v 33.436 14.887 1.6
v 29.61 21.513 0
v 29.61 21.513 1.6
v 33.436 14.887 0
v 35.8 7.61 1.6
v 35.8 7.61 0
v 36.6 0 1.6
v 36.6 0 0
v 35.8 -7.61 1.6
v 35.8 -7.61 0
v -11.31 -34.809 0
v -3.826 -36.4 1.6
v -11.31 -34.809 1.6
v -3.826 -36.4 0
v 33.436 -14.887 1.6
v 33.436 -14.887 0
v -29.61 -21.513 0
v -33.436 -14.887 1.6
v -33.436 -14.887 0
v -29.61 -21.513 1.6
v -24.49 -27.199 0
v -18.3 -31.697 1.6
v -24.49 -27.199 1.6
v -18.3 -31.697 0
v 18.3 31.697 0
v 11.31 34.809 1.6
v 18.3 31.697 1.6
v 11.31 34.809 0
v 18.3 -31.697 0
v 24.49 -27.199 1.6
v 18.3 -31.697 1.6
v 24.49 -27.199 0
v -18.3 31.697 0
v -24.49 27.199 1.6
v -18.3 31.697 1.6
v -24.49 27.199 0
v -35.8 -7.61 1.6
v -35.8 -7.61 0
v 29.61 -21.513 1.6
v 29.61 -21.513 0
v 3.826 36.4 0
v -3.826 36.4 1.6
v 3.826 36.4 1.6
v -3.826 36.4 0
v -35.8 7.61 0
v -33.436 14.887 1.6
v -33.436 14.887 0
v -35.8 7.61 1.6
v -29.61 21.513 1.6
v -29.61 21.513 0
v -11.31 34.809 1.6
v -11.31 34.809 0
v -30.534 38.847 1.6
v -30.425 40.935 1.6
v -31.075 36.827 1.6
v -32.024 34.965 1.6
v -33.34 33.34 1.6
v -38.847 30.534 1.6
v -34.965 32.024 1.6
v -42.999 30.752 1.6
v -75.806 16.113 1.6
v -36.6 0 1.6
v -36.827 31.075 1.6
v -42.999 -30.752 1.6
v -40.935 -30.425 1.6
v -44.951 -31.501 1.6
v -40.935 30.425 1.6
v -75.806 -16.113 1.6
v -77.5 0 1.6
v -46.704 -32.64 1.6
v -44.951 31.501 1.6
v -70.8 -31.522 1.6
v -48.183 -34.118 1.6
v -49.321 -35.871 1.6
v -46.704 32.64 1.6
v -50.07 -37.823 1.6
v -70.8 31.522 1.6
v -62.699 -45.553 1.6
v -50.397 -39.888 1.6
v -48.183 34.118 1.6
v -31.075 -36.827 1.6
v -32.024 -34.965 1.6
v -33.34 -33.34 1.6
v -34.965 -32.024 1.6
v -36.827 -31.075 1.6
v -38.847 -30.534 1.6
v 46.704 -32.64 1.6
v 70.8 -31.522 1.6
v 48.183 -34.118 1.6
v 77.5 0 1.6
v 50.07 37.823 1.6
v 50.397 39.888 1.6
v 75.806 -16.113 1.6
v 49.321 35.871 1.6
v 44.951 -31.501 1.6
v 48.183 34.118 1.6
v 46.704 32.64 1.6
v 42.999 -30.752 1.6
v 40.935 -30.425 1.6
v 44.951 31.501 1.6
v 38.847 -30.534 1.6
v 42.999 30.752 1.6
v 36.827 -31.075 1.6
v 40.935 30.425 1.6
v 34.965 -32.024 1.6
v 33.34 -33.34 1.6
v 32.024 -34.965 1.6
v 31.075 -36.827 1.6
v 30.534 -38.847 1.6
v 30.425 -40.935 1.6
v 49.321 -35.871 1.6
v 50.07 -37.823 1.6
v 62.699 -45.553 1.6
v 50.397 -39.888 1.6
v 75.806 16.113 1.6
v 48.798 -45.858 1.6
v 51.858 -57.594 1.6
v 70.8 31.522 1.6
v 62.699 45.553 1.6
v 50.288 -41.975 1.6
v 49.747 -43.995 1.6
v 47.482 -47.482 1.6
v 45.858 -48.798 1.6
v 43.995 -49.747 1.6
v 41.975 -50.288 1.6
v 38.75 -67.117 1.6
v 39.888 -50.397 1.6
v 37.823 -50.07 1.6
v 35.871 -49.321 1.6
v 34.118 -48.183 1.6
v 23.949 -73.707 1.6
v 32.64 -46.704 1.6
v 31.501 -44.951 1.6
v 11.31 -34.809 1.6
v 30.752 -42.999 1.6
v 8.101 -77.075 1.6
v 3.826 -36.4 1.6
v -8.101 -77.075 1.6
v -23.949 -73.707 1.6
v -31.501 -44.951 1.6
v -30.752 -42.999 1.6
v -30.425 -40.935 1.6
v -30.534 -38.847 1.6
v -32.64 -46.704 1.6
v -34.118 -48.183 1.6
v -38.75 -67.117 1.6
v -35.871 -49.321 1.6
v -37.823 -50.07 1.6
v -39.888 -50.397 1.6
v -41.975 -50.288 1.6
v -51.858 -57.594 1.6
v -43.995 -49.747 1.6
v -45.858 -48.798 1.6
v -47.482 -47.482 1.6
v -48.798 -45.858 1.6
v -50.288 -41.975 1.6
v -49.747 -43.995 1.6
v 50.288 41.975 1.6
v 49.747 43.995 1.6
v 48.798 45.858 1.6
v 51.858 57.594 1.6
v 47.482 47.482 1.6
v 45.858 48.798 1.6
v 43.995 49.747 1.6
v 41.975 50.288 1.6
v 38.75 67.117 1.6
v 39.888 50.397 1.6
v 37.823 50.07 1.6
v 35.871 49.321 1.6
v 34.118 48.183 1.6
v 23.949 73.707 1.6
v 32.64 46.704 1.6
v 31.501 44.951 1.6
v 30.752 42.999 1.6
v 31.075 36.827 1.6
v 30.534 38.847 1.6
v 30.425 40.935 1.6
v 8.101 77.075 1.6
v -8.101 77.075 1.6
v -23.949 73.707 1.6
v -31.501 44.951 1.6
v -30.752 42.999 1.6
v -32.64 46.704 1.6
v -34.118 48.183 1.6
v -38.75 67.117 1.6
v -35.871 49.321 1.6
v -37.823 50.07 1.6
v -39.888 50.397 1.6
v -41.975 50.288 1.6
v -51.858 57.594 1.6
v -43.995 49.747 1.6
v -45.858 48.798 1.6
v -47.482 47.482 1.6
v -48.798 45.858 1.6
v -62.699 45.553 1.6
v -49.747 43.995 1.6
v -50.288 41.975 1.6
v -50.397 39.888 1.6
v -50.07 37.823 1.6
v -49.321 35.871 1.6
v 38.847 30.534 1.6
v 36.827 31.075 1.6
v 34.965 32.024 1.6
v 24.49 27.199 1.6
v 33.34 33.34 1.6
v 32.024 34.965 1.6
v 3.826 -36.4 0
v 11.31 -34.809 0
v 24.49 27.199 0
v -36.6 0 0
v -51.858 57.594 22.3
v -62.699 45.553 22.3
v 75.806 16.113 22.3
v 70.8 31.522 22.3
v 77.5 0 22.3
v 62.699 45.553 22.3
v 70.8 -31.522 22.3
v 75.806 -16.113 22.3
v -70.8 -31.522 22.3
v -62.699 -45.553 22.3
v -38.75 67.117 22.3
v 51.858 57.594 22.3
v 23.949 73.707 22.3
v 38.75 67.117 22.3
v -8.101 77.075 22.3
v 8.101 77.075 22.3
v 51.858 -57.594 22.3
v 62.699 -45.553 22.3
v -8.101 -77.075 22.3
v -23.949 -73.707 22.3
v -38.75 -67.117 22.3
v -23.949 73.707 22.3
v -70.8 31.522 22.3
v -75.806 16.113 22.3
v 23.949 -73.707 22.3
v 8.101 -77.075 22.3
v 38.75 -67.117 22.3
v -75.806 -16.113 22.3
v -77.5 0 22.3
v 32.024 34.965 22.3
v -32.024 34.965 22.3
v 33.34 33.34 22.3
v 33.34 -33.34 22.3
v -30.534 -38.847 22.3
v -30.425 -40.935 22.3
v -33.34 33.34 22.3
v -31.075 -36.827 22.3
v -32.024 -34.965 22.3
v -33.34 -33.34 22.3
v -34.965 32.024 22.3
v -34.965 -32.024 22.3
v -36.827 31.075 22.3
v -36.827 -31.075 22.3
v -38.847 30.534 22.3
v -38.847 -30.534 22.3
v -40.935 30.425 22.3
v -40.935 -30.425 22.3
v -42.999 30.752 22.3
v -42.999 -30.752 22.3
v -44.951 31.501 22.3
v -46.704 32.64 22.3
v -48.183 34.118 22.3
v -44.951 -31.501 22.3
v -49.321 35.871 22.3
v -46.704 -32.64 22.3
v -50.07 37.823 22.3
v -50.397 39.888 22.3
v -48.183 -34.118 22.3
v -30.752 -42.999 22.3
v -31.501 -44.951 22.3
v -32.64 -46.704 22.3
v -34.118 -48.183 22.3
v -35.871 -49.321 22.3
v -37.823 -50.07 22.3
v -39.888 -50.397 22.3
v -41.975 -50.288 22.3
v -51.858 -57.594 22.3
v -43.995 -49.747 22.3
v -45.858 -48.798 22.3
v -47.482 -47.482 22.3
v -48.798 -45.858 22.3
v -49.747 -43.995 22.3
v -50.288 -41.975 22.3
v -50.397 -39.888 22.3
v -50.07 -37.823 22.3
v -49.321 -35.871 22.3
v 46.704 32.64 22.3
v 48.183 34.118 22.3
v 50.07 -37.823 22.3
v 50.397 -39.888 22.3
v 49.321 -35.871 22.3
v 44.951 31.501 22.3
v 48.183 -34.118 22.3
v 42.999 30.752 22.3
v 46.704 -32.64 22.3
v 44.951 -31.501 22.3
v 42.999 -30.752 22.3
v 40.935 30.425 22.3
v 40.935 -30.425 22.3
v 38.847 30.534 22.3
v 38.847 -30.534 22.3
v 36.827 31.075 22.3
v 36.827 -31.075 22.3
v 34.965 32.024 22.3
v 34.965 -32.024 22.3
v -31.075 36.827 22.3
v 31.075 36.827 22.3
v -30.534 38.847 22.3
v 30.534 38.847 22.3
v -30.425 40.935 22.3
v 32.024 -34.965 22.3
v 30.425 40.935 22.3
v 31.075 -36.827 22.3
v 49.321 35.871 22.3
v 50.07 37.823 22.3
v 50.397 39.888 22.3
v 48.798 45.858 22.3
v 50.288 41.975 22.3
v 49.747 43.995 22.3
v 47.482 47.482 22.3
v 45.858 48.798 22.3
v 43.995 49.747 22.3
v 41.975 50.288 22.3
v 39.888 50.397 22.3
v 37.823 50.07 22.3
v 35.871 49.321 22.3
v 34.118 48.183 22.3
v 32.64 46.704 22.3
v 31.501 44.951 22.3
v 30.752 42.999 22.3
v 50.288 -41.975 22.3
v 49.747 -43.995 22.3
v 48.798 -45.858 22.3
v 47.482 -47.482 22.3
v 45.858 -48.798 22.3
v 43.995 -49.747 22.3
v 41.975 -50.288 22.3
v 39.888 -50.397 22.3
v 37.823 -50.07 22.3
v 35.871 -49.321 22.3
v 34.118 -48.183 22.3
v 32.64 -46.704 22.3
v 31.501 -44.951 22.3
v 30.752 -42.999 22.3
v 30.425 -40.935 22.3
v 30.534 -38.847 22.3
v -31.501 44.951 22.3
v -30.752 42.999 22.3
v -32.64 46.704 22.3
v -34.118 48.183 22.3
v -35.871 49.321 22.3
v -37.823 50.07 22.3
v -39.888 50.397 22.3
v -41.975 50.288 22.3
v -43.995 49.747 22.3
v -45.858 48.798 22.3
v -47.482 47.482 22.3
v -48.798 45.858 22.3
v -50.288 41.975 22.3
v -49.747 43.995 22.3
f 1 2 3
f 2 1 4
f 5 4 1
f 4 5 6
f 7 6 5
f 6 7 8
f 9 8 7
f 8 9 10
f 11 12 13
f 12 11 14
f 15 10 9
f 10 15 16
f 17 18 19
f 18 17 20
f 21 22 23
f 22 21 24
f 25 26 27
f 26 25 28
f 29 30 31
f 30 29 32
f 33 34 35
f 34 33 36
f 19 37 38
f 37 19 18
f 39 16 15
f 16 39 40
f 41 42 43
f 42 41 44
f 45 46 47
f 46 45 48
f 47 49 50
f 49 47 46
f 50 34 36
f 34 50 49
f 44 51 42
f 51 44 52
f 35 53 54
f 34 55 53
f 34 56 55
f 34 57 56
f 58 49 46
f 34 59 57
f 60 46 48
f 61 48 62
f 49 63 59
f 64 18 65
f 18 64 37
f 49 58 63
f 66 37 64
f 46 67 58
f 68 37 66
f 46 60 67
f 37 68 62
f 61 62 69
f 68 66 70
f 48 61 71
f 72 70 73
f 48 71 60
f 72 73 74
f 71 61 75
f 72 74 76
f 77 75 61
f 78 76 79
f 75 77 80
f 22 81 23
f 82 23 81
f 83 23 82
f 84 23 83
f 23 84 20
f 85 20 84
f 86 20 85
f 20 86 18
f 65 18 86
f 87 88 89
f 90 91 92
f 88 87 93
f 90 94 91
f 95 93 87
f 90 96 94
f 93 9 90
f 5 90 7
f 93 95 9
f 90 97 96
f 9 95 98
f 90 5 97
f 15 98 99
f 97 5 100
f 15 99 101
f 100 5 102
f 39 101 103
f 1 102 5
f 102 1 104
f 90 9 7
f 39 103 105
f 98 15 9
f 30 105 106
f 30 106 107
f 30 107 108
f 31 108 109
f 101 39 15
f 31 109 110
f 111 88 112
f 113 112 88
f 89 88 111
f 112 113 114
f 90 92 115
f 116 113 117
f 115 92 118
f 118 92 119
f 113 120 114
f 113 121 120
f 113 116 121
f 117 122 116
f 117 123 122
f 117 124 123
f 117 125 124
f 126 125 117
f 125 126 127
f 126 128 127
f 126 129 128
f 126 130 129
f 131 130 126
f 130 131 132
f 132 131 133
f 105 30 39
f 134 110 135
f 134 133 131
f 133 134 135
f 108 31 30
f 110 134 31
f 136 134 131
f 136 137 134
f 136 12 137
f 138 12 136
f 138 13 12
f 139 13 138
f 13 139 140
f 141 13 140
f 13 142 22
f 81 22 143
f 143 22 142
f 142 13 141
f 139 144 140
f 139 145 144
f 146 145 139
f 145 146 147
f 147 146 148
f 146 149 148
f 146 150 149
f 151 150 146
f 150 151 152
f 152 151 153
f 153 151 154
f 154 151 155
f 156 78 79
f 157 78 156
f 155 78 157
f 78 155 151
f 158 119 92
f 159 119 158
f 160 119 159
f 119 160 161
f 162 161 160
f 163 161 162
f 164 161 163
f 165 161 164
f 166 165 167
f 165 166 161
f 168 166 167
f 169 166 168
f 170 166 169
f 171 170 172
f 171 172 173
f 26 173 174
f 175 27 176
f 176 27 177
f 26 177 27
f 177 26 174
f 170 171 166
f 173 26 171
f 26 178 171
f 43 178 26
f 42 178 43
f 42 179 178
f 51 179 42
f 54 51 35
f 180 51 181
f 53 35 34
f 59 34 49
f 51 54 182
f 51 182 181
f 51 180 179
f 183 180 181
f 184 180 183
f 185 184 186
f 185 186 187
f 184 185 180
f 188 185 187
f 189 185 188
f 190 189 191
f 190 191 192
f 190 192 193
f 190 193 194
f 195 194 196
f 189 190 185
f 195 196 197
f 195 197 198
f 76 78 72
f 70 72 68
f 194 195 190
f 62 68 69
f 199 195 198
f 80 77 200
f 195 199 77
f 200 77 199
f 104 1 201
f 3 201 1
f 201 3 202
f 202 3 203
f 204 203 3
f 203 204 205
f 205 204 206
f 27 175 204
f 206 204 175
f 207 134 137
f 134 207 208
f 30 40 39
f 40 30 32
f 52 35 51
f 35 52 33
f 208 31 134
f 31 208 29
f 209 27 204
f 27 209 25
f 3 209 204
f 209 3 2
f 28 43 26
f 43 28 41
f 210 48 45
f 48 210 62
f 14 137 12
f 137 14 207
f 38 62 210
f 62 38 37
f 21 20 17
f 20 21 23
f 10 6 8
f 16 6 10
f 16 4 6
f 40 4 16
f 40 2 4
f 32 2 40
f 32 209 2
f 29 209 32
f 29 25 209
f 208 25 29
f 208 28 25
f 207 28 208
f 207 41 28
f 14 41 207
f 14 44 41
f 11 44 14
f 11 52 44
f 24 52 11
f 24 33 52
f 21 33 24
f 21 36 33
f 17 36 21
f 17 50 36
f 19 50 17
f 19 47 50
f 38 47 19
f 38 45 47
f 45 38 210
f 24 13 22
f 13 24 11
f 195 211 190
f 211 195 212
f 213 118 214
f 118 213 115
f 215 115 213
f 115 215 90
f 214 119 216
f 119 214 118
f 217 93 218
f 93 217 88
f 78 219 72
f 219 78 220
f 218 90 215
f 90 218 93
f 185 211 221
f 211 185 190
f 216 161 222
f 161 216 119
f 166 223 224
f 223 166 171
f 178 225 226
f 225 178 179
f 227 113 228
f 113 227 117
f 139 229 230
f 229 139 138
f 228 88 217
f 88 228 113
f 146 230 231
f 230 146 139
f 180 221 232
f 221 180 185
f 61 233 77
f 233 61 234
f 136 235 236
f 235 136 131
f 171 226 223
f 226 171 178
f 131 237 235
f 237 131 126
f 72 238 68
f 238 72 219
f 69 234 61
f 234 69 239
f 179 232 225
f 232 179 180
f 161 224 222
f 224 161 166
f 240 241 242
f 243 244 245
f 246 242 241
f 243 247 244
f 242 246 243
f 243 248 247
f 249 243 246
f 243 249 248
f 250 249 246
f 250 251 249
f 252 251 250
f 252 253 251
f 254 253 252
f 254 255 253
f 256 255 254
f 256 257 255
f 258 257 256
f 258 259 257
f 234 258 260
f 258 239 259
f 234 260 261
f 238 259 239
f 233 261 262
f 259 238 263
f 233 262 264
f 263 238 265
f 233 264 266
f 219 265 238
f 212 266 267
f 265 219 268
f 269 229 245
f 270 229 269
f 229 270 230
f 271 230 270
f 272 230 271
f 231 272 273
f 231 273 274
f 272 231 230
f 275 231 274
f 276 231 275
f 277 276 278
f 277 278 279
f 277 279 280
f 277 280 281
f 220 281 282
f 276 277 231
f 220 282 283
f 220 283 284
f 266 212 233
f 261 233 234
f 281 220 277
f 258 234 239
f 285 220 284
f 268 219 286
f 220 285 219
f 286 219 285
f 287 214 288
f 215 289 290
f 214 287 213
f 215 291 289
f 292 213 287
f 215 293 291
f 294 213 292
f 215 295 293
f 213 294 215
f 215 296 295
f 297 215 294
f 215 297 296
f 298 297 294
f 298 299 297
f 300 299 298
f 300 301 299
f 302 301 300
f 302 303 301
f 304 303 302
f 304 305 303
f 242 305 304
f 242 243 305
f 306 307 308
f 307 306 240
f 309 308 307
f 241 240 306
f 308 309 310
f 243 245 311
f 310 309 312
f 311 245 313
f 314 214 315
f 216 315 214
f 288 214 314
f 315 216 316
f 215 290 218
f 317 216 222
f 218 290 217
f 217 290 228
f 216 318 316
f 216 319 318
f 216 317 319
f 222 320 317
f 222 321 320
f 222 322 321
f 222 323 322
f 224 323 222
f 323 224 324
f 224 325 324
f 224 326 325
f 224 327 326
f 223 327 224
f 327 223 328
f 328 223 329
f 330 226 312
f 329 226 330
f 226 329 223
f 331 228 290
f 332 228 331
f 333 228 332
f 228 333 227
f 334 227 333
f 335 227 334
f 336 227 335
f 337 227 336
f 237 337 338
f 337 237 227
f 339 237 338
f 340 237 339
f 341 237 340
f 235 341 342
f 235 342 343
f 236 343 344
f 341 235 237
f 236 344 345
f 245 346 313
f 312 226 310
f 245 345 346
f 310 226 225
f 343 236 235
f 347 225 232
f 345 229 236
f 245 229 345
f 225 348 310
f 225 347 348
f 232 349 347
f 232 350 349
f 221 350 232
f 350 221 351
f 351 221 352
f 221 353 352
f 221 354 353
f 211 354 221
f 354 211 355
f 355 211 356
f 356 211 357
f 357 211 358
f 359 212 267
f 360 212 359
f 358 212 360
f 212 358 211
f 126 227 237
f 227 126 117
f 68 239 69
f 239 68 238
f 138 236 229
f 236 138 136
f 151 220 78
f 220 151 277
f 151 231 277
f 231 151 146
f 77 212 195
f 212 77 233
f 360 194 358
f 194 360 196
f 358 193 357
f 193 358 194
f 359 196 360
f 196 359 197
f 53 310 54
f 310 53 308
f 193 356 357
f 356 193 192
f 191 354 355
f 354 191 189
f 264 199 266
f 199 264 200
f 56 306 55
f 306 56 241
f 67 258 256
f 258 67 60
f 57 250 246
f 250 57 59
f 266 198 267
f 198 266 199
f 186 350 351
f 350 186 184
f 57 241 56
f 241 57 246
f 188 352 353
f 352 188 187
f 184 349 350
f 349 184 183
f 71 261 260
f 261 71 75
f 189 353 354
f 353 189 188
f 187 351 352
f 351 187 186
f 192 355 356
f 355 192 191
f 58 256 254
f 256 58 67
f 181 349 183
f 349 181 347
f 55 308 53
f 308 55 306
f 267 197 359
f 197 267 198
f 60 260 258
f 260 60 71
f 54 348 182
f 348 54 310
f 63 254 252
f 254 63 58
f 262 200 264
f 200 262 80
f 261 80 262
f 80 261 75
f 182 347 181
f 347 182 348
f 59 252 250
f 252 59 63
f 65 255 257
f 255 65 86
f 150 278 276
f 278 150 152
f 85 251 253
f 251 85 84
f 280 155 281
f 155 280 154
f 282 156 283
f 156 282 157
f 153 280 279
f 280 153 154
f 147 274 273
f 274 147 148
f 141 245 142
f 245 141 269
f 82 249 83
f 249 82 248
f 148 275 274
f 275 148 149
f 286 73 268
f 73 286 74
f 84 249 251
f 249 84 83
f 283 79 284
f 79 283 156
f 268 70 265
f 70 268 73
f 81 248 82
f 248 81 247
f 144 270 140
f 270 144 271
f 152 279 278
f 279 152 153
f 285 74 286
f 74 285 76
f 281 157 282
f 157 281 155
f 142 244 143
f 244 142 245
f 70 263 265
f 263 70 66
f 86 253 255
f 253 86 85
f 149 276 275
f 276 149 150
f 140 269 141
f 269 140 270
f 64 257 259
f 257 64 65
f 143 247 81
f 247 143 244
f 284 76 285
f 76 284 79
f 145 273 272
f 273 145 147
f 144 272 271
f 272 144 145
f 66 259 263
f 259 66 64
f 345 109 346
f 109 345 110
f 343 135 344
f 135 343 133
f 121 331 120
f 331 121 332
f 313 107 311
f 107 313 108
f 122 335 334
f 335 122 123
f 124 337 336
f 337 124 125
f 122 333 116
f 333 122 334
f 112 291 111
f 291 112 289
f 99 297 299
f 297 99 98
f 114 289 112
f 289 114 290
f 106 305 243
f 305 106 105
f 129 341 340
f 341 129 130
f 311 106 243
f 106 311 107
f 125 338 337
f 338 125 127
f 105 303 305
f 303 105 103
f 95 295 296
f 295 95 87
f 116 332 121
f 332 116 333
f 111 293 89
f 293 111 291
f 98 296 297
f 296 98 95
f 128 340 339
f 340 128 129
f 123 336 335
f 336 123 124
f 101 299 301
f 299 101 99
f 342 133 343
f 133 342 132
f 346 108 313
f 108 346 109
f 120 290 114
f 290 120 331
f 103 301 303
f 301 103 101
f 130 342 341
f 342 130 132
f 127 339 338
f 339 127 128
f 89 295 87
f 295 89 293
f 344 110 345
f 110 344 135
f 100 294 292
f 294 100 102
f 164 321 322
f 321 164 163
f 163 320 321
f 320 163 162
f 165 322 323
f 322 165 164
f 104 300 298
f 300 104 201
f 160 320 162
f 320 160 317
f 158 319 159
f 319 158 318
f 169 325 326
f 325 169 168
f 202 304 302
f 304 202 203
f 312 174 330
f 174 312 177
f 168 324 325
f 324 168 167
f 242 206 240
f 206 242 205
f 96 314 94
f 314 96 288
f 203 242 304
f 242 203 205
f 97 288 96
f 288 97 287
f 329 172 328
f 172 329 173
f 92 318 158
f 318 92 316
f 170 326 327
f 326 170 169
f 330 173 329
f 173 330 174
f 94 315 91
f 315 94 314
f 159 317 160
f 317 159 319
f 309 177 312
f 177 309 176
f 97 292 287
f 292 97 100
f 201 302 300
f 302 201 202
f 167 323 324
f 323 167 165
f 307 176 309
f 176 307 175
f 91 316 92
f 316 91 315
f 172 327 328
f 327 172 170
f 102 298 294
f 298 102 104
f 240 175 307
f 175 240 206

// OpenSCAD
blindFlange();
module blindFlange(od=155,t=20.7,rfLength=1.6,rfDia=73.2,hole=20,pcd=114.3,n=4){
    difference(){
        union(){
            //raised face
            cylinder(h=rfLength,d=rfDia);
            //flange
            translate([0,0,rfLength]) cylinder(h=t,d=od);
            }
        //holes
        for(i=[1:n]){
            rotate([0,0,i*360/n+360/(n*2)]) translate([pcd/2,0,0]) cylinder(h=t+2,d=hole);
        }
    }
}
